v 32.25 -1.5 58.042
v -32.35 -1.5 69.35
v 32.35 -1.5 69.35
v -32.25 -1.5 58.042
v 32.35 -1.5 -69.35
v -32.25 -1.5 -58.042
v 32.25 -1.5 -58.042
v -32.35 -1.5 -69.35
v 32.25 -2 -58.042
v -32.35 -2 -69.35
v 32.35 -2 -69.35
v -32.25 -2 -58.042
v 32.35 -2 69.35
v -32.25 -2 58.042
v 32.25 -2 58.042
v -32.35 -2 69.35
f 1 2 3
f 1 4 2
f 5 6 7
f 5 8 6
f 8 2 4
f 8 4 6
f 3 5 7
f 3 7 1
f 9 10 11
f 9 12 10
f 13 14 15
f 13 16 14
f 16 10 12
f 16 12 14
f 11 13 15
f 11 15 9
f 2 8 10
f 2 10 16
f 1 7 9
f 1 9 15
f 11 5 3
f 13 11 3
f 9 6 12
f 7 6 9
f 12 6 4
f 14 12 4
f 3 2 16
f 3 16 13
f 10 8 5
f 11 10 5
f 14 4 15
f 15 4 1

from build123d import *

# Parameters (mm, degrees)
F0_W      = 64.7
F0_H      = 138.7
F1_DEPTH  = 2
F1_FACE_W = 64.7
F1_FACE_H = 138.7
F2_DEPTH  = 1.5
F3_W      = 64.5
F3_H      = 116.084408
F4_DEPTH  = 43.240232


with BuildPart() as f1:
    # F0 (on Front) → F1 (new body)
    with BuildSketch(Plane.XZ):
        Rectangle(F0_W, F0_H)
    extrude(amount=F1_DEPTH)

    # F1_face (on face) → F2 (cut)
    with BuildSketch(Plane(origin=(0, 0, 0), x_dir=(1, 0, 0), z_dir=(0, 1, 0))):
        Rectangle(F1_FACE_W, F1_FACE_H)
    extrude(amount=-F2_DEPTH, mode=Mode.SUBTRACT)

    # F3 (on Front) → F4 (cut)
    with BuildSketch(Plane.XZ):
        Rectangle(F3_W, F3_H)
    extrude(amount=F4_DEPTH, mode=Mode.SUBTRACT)


solid = f1.part
